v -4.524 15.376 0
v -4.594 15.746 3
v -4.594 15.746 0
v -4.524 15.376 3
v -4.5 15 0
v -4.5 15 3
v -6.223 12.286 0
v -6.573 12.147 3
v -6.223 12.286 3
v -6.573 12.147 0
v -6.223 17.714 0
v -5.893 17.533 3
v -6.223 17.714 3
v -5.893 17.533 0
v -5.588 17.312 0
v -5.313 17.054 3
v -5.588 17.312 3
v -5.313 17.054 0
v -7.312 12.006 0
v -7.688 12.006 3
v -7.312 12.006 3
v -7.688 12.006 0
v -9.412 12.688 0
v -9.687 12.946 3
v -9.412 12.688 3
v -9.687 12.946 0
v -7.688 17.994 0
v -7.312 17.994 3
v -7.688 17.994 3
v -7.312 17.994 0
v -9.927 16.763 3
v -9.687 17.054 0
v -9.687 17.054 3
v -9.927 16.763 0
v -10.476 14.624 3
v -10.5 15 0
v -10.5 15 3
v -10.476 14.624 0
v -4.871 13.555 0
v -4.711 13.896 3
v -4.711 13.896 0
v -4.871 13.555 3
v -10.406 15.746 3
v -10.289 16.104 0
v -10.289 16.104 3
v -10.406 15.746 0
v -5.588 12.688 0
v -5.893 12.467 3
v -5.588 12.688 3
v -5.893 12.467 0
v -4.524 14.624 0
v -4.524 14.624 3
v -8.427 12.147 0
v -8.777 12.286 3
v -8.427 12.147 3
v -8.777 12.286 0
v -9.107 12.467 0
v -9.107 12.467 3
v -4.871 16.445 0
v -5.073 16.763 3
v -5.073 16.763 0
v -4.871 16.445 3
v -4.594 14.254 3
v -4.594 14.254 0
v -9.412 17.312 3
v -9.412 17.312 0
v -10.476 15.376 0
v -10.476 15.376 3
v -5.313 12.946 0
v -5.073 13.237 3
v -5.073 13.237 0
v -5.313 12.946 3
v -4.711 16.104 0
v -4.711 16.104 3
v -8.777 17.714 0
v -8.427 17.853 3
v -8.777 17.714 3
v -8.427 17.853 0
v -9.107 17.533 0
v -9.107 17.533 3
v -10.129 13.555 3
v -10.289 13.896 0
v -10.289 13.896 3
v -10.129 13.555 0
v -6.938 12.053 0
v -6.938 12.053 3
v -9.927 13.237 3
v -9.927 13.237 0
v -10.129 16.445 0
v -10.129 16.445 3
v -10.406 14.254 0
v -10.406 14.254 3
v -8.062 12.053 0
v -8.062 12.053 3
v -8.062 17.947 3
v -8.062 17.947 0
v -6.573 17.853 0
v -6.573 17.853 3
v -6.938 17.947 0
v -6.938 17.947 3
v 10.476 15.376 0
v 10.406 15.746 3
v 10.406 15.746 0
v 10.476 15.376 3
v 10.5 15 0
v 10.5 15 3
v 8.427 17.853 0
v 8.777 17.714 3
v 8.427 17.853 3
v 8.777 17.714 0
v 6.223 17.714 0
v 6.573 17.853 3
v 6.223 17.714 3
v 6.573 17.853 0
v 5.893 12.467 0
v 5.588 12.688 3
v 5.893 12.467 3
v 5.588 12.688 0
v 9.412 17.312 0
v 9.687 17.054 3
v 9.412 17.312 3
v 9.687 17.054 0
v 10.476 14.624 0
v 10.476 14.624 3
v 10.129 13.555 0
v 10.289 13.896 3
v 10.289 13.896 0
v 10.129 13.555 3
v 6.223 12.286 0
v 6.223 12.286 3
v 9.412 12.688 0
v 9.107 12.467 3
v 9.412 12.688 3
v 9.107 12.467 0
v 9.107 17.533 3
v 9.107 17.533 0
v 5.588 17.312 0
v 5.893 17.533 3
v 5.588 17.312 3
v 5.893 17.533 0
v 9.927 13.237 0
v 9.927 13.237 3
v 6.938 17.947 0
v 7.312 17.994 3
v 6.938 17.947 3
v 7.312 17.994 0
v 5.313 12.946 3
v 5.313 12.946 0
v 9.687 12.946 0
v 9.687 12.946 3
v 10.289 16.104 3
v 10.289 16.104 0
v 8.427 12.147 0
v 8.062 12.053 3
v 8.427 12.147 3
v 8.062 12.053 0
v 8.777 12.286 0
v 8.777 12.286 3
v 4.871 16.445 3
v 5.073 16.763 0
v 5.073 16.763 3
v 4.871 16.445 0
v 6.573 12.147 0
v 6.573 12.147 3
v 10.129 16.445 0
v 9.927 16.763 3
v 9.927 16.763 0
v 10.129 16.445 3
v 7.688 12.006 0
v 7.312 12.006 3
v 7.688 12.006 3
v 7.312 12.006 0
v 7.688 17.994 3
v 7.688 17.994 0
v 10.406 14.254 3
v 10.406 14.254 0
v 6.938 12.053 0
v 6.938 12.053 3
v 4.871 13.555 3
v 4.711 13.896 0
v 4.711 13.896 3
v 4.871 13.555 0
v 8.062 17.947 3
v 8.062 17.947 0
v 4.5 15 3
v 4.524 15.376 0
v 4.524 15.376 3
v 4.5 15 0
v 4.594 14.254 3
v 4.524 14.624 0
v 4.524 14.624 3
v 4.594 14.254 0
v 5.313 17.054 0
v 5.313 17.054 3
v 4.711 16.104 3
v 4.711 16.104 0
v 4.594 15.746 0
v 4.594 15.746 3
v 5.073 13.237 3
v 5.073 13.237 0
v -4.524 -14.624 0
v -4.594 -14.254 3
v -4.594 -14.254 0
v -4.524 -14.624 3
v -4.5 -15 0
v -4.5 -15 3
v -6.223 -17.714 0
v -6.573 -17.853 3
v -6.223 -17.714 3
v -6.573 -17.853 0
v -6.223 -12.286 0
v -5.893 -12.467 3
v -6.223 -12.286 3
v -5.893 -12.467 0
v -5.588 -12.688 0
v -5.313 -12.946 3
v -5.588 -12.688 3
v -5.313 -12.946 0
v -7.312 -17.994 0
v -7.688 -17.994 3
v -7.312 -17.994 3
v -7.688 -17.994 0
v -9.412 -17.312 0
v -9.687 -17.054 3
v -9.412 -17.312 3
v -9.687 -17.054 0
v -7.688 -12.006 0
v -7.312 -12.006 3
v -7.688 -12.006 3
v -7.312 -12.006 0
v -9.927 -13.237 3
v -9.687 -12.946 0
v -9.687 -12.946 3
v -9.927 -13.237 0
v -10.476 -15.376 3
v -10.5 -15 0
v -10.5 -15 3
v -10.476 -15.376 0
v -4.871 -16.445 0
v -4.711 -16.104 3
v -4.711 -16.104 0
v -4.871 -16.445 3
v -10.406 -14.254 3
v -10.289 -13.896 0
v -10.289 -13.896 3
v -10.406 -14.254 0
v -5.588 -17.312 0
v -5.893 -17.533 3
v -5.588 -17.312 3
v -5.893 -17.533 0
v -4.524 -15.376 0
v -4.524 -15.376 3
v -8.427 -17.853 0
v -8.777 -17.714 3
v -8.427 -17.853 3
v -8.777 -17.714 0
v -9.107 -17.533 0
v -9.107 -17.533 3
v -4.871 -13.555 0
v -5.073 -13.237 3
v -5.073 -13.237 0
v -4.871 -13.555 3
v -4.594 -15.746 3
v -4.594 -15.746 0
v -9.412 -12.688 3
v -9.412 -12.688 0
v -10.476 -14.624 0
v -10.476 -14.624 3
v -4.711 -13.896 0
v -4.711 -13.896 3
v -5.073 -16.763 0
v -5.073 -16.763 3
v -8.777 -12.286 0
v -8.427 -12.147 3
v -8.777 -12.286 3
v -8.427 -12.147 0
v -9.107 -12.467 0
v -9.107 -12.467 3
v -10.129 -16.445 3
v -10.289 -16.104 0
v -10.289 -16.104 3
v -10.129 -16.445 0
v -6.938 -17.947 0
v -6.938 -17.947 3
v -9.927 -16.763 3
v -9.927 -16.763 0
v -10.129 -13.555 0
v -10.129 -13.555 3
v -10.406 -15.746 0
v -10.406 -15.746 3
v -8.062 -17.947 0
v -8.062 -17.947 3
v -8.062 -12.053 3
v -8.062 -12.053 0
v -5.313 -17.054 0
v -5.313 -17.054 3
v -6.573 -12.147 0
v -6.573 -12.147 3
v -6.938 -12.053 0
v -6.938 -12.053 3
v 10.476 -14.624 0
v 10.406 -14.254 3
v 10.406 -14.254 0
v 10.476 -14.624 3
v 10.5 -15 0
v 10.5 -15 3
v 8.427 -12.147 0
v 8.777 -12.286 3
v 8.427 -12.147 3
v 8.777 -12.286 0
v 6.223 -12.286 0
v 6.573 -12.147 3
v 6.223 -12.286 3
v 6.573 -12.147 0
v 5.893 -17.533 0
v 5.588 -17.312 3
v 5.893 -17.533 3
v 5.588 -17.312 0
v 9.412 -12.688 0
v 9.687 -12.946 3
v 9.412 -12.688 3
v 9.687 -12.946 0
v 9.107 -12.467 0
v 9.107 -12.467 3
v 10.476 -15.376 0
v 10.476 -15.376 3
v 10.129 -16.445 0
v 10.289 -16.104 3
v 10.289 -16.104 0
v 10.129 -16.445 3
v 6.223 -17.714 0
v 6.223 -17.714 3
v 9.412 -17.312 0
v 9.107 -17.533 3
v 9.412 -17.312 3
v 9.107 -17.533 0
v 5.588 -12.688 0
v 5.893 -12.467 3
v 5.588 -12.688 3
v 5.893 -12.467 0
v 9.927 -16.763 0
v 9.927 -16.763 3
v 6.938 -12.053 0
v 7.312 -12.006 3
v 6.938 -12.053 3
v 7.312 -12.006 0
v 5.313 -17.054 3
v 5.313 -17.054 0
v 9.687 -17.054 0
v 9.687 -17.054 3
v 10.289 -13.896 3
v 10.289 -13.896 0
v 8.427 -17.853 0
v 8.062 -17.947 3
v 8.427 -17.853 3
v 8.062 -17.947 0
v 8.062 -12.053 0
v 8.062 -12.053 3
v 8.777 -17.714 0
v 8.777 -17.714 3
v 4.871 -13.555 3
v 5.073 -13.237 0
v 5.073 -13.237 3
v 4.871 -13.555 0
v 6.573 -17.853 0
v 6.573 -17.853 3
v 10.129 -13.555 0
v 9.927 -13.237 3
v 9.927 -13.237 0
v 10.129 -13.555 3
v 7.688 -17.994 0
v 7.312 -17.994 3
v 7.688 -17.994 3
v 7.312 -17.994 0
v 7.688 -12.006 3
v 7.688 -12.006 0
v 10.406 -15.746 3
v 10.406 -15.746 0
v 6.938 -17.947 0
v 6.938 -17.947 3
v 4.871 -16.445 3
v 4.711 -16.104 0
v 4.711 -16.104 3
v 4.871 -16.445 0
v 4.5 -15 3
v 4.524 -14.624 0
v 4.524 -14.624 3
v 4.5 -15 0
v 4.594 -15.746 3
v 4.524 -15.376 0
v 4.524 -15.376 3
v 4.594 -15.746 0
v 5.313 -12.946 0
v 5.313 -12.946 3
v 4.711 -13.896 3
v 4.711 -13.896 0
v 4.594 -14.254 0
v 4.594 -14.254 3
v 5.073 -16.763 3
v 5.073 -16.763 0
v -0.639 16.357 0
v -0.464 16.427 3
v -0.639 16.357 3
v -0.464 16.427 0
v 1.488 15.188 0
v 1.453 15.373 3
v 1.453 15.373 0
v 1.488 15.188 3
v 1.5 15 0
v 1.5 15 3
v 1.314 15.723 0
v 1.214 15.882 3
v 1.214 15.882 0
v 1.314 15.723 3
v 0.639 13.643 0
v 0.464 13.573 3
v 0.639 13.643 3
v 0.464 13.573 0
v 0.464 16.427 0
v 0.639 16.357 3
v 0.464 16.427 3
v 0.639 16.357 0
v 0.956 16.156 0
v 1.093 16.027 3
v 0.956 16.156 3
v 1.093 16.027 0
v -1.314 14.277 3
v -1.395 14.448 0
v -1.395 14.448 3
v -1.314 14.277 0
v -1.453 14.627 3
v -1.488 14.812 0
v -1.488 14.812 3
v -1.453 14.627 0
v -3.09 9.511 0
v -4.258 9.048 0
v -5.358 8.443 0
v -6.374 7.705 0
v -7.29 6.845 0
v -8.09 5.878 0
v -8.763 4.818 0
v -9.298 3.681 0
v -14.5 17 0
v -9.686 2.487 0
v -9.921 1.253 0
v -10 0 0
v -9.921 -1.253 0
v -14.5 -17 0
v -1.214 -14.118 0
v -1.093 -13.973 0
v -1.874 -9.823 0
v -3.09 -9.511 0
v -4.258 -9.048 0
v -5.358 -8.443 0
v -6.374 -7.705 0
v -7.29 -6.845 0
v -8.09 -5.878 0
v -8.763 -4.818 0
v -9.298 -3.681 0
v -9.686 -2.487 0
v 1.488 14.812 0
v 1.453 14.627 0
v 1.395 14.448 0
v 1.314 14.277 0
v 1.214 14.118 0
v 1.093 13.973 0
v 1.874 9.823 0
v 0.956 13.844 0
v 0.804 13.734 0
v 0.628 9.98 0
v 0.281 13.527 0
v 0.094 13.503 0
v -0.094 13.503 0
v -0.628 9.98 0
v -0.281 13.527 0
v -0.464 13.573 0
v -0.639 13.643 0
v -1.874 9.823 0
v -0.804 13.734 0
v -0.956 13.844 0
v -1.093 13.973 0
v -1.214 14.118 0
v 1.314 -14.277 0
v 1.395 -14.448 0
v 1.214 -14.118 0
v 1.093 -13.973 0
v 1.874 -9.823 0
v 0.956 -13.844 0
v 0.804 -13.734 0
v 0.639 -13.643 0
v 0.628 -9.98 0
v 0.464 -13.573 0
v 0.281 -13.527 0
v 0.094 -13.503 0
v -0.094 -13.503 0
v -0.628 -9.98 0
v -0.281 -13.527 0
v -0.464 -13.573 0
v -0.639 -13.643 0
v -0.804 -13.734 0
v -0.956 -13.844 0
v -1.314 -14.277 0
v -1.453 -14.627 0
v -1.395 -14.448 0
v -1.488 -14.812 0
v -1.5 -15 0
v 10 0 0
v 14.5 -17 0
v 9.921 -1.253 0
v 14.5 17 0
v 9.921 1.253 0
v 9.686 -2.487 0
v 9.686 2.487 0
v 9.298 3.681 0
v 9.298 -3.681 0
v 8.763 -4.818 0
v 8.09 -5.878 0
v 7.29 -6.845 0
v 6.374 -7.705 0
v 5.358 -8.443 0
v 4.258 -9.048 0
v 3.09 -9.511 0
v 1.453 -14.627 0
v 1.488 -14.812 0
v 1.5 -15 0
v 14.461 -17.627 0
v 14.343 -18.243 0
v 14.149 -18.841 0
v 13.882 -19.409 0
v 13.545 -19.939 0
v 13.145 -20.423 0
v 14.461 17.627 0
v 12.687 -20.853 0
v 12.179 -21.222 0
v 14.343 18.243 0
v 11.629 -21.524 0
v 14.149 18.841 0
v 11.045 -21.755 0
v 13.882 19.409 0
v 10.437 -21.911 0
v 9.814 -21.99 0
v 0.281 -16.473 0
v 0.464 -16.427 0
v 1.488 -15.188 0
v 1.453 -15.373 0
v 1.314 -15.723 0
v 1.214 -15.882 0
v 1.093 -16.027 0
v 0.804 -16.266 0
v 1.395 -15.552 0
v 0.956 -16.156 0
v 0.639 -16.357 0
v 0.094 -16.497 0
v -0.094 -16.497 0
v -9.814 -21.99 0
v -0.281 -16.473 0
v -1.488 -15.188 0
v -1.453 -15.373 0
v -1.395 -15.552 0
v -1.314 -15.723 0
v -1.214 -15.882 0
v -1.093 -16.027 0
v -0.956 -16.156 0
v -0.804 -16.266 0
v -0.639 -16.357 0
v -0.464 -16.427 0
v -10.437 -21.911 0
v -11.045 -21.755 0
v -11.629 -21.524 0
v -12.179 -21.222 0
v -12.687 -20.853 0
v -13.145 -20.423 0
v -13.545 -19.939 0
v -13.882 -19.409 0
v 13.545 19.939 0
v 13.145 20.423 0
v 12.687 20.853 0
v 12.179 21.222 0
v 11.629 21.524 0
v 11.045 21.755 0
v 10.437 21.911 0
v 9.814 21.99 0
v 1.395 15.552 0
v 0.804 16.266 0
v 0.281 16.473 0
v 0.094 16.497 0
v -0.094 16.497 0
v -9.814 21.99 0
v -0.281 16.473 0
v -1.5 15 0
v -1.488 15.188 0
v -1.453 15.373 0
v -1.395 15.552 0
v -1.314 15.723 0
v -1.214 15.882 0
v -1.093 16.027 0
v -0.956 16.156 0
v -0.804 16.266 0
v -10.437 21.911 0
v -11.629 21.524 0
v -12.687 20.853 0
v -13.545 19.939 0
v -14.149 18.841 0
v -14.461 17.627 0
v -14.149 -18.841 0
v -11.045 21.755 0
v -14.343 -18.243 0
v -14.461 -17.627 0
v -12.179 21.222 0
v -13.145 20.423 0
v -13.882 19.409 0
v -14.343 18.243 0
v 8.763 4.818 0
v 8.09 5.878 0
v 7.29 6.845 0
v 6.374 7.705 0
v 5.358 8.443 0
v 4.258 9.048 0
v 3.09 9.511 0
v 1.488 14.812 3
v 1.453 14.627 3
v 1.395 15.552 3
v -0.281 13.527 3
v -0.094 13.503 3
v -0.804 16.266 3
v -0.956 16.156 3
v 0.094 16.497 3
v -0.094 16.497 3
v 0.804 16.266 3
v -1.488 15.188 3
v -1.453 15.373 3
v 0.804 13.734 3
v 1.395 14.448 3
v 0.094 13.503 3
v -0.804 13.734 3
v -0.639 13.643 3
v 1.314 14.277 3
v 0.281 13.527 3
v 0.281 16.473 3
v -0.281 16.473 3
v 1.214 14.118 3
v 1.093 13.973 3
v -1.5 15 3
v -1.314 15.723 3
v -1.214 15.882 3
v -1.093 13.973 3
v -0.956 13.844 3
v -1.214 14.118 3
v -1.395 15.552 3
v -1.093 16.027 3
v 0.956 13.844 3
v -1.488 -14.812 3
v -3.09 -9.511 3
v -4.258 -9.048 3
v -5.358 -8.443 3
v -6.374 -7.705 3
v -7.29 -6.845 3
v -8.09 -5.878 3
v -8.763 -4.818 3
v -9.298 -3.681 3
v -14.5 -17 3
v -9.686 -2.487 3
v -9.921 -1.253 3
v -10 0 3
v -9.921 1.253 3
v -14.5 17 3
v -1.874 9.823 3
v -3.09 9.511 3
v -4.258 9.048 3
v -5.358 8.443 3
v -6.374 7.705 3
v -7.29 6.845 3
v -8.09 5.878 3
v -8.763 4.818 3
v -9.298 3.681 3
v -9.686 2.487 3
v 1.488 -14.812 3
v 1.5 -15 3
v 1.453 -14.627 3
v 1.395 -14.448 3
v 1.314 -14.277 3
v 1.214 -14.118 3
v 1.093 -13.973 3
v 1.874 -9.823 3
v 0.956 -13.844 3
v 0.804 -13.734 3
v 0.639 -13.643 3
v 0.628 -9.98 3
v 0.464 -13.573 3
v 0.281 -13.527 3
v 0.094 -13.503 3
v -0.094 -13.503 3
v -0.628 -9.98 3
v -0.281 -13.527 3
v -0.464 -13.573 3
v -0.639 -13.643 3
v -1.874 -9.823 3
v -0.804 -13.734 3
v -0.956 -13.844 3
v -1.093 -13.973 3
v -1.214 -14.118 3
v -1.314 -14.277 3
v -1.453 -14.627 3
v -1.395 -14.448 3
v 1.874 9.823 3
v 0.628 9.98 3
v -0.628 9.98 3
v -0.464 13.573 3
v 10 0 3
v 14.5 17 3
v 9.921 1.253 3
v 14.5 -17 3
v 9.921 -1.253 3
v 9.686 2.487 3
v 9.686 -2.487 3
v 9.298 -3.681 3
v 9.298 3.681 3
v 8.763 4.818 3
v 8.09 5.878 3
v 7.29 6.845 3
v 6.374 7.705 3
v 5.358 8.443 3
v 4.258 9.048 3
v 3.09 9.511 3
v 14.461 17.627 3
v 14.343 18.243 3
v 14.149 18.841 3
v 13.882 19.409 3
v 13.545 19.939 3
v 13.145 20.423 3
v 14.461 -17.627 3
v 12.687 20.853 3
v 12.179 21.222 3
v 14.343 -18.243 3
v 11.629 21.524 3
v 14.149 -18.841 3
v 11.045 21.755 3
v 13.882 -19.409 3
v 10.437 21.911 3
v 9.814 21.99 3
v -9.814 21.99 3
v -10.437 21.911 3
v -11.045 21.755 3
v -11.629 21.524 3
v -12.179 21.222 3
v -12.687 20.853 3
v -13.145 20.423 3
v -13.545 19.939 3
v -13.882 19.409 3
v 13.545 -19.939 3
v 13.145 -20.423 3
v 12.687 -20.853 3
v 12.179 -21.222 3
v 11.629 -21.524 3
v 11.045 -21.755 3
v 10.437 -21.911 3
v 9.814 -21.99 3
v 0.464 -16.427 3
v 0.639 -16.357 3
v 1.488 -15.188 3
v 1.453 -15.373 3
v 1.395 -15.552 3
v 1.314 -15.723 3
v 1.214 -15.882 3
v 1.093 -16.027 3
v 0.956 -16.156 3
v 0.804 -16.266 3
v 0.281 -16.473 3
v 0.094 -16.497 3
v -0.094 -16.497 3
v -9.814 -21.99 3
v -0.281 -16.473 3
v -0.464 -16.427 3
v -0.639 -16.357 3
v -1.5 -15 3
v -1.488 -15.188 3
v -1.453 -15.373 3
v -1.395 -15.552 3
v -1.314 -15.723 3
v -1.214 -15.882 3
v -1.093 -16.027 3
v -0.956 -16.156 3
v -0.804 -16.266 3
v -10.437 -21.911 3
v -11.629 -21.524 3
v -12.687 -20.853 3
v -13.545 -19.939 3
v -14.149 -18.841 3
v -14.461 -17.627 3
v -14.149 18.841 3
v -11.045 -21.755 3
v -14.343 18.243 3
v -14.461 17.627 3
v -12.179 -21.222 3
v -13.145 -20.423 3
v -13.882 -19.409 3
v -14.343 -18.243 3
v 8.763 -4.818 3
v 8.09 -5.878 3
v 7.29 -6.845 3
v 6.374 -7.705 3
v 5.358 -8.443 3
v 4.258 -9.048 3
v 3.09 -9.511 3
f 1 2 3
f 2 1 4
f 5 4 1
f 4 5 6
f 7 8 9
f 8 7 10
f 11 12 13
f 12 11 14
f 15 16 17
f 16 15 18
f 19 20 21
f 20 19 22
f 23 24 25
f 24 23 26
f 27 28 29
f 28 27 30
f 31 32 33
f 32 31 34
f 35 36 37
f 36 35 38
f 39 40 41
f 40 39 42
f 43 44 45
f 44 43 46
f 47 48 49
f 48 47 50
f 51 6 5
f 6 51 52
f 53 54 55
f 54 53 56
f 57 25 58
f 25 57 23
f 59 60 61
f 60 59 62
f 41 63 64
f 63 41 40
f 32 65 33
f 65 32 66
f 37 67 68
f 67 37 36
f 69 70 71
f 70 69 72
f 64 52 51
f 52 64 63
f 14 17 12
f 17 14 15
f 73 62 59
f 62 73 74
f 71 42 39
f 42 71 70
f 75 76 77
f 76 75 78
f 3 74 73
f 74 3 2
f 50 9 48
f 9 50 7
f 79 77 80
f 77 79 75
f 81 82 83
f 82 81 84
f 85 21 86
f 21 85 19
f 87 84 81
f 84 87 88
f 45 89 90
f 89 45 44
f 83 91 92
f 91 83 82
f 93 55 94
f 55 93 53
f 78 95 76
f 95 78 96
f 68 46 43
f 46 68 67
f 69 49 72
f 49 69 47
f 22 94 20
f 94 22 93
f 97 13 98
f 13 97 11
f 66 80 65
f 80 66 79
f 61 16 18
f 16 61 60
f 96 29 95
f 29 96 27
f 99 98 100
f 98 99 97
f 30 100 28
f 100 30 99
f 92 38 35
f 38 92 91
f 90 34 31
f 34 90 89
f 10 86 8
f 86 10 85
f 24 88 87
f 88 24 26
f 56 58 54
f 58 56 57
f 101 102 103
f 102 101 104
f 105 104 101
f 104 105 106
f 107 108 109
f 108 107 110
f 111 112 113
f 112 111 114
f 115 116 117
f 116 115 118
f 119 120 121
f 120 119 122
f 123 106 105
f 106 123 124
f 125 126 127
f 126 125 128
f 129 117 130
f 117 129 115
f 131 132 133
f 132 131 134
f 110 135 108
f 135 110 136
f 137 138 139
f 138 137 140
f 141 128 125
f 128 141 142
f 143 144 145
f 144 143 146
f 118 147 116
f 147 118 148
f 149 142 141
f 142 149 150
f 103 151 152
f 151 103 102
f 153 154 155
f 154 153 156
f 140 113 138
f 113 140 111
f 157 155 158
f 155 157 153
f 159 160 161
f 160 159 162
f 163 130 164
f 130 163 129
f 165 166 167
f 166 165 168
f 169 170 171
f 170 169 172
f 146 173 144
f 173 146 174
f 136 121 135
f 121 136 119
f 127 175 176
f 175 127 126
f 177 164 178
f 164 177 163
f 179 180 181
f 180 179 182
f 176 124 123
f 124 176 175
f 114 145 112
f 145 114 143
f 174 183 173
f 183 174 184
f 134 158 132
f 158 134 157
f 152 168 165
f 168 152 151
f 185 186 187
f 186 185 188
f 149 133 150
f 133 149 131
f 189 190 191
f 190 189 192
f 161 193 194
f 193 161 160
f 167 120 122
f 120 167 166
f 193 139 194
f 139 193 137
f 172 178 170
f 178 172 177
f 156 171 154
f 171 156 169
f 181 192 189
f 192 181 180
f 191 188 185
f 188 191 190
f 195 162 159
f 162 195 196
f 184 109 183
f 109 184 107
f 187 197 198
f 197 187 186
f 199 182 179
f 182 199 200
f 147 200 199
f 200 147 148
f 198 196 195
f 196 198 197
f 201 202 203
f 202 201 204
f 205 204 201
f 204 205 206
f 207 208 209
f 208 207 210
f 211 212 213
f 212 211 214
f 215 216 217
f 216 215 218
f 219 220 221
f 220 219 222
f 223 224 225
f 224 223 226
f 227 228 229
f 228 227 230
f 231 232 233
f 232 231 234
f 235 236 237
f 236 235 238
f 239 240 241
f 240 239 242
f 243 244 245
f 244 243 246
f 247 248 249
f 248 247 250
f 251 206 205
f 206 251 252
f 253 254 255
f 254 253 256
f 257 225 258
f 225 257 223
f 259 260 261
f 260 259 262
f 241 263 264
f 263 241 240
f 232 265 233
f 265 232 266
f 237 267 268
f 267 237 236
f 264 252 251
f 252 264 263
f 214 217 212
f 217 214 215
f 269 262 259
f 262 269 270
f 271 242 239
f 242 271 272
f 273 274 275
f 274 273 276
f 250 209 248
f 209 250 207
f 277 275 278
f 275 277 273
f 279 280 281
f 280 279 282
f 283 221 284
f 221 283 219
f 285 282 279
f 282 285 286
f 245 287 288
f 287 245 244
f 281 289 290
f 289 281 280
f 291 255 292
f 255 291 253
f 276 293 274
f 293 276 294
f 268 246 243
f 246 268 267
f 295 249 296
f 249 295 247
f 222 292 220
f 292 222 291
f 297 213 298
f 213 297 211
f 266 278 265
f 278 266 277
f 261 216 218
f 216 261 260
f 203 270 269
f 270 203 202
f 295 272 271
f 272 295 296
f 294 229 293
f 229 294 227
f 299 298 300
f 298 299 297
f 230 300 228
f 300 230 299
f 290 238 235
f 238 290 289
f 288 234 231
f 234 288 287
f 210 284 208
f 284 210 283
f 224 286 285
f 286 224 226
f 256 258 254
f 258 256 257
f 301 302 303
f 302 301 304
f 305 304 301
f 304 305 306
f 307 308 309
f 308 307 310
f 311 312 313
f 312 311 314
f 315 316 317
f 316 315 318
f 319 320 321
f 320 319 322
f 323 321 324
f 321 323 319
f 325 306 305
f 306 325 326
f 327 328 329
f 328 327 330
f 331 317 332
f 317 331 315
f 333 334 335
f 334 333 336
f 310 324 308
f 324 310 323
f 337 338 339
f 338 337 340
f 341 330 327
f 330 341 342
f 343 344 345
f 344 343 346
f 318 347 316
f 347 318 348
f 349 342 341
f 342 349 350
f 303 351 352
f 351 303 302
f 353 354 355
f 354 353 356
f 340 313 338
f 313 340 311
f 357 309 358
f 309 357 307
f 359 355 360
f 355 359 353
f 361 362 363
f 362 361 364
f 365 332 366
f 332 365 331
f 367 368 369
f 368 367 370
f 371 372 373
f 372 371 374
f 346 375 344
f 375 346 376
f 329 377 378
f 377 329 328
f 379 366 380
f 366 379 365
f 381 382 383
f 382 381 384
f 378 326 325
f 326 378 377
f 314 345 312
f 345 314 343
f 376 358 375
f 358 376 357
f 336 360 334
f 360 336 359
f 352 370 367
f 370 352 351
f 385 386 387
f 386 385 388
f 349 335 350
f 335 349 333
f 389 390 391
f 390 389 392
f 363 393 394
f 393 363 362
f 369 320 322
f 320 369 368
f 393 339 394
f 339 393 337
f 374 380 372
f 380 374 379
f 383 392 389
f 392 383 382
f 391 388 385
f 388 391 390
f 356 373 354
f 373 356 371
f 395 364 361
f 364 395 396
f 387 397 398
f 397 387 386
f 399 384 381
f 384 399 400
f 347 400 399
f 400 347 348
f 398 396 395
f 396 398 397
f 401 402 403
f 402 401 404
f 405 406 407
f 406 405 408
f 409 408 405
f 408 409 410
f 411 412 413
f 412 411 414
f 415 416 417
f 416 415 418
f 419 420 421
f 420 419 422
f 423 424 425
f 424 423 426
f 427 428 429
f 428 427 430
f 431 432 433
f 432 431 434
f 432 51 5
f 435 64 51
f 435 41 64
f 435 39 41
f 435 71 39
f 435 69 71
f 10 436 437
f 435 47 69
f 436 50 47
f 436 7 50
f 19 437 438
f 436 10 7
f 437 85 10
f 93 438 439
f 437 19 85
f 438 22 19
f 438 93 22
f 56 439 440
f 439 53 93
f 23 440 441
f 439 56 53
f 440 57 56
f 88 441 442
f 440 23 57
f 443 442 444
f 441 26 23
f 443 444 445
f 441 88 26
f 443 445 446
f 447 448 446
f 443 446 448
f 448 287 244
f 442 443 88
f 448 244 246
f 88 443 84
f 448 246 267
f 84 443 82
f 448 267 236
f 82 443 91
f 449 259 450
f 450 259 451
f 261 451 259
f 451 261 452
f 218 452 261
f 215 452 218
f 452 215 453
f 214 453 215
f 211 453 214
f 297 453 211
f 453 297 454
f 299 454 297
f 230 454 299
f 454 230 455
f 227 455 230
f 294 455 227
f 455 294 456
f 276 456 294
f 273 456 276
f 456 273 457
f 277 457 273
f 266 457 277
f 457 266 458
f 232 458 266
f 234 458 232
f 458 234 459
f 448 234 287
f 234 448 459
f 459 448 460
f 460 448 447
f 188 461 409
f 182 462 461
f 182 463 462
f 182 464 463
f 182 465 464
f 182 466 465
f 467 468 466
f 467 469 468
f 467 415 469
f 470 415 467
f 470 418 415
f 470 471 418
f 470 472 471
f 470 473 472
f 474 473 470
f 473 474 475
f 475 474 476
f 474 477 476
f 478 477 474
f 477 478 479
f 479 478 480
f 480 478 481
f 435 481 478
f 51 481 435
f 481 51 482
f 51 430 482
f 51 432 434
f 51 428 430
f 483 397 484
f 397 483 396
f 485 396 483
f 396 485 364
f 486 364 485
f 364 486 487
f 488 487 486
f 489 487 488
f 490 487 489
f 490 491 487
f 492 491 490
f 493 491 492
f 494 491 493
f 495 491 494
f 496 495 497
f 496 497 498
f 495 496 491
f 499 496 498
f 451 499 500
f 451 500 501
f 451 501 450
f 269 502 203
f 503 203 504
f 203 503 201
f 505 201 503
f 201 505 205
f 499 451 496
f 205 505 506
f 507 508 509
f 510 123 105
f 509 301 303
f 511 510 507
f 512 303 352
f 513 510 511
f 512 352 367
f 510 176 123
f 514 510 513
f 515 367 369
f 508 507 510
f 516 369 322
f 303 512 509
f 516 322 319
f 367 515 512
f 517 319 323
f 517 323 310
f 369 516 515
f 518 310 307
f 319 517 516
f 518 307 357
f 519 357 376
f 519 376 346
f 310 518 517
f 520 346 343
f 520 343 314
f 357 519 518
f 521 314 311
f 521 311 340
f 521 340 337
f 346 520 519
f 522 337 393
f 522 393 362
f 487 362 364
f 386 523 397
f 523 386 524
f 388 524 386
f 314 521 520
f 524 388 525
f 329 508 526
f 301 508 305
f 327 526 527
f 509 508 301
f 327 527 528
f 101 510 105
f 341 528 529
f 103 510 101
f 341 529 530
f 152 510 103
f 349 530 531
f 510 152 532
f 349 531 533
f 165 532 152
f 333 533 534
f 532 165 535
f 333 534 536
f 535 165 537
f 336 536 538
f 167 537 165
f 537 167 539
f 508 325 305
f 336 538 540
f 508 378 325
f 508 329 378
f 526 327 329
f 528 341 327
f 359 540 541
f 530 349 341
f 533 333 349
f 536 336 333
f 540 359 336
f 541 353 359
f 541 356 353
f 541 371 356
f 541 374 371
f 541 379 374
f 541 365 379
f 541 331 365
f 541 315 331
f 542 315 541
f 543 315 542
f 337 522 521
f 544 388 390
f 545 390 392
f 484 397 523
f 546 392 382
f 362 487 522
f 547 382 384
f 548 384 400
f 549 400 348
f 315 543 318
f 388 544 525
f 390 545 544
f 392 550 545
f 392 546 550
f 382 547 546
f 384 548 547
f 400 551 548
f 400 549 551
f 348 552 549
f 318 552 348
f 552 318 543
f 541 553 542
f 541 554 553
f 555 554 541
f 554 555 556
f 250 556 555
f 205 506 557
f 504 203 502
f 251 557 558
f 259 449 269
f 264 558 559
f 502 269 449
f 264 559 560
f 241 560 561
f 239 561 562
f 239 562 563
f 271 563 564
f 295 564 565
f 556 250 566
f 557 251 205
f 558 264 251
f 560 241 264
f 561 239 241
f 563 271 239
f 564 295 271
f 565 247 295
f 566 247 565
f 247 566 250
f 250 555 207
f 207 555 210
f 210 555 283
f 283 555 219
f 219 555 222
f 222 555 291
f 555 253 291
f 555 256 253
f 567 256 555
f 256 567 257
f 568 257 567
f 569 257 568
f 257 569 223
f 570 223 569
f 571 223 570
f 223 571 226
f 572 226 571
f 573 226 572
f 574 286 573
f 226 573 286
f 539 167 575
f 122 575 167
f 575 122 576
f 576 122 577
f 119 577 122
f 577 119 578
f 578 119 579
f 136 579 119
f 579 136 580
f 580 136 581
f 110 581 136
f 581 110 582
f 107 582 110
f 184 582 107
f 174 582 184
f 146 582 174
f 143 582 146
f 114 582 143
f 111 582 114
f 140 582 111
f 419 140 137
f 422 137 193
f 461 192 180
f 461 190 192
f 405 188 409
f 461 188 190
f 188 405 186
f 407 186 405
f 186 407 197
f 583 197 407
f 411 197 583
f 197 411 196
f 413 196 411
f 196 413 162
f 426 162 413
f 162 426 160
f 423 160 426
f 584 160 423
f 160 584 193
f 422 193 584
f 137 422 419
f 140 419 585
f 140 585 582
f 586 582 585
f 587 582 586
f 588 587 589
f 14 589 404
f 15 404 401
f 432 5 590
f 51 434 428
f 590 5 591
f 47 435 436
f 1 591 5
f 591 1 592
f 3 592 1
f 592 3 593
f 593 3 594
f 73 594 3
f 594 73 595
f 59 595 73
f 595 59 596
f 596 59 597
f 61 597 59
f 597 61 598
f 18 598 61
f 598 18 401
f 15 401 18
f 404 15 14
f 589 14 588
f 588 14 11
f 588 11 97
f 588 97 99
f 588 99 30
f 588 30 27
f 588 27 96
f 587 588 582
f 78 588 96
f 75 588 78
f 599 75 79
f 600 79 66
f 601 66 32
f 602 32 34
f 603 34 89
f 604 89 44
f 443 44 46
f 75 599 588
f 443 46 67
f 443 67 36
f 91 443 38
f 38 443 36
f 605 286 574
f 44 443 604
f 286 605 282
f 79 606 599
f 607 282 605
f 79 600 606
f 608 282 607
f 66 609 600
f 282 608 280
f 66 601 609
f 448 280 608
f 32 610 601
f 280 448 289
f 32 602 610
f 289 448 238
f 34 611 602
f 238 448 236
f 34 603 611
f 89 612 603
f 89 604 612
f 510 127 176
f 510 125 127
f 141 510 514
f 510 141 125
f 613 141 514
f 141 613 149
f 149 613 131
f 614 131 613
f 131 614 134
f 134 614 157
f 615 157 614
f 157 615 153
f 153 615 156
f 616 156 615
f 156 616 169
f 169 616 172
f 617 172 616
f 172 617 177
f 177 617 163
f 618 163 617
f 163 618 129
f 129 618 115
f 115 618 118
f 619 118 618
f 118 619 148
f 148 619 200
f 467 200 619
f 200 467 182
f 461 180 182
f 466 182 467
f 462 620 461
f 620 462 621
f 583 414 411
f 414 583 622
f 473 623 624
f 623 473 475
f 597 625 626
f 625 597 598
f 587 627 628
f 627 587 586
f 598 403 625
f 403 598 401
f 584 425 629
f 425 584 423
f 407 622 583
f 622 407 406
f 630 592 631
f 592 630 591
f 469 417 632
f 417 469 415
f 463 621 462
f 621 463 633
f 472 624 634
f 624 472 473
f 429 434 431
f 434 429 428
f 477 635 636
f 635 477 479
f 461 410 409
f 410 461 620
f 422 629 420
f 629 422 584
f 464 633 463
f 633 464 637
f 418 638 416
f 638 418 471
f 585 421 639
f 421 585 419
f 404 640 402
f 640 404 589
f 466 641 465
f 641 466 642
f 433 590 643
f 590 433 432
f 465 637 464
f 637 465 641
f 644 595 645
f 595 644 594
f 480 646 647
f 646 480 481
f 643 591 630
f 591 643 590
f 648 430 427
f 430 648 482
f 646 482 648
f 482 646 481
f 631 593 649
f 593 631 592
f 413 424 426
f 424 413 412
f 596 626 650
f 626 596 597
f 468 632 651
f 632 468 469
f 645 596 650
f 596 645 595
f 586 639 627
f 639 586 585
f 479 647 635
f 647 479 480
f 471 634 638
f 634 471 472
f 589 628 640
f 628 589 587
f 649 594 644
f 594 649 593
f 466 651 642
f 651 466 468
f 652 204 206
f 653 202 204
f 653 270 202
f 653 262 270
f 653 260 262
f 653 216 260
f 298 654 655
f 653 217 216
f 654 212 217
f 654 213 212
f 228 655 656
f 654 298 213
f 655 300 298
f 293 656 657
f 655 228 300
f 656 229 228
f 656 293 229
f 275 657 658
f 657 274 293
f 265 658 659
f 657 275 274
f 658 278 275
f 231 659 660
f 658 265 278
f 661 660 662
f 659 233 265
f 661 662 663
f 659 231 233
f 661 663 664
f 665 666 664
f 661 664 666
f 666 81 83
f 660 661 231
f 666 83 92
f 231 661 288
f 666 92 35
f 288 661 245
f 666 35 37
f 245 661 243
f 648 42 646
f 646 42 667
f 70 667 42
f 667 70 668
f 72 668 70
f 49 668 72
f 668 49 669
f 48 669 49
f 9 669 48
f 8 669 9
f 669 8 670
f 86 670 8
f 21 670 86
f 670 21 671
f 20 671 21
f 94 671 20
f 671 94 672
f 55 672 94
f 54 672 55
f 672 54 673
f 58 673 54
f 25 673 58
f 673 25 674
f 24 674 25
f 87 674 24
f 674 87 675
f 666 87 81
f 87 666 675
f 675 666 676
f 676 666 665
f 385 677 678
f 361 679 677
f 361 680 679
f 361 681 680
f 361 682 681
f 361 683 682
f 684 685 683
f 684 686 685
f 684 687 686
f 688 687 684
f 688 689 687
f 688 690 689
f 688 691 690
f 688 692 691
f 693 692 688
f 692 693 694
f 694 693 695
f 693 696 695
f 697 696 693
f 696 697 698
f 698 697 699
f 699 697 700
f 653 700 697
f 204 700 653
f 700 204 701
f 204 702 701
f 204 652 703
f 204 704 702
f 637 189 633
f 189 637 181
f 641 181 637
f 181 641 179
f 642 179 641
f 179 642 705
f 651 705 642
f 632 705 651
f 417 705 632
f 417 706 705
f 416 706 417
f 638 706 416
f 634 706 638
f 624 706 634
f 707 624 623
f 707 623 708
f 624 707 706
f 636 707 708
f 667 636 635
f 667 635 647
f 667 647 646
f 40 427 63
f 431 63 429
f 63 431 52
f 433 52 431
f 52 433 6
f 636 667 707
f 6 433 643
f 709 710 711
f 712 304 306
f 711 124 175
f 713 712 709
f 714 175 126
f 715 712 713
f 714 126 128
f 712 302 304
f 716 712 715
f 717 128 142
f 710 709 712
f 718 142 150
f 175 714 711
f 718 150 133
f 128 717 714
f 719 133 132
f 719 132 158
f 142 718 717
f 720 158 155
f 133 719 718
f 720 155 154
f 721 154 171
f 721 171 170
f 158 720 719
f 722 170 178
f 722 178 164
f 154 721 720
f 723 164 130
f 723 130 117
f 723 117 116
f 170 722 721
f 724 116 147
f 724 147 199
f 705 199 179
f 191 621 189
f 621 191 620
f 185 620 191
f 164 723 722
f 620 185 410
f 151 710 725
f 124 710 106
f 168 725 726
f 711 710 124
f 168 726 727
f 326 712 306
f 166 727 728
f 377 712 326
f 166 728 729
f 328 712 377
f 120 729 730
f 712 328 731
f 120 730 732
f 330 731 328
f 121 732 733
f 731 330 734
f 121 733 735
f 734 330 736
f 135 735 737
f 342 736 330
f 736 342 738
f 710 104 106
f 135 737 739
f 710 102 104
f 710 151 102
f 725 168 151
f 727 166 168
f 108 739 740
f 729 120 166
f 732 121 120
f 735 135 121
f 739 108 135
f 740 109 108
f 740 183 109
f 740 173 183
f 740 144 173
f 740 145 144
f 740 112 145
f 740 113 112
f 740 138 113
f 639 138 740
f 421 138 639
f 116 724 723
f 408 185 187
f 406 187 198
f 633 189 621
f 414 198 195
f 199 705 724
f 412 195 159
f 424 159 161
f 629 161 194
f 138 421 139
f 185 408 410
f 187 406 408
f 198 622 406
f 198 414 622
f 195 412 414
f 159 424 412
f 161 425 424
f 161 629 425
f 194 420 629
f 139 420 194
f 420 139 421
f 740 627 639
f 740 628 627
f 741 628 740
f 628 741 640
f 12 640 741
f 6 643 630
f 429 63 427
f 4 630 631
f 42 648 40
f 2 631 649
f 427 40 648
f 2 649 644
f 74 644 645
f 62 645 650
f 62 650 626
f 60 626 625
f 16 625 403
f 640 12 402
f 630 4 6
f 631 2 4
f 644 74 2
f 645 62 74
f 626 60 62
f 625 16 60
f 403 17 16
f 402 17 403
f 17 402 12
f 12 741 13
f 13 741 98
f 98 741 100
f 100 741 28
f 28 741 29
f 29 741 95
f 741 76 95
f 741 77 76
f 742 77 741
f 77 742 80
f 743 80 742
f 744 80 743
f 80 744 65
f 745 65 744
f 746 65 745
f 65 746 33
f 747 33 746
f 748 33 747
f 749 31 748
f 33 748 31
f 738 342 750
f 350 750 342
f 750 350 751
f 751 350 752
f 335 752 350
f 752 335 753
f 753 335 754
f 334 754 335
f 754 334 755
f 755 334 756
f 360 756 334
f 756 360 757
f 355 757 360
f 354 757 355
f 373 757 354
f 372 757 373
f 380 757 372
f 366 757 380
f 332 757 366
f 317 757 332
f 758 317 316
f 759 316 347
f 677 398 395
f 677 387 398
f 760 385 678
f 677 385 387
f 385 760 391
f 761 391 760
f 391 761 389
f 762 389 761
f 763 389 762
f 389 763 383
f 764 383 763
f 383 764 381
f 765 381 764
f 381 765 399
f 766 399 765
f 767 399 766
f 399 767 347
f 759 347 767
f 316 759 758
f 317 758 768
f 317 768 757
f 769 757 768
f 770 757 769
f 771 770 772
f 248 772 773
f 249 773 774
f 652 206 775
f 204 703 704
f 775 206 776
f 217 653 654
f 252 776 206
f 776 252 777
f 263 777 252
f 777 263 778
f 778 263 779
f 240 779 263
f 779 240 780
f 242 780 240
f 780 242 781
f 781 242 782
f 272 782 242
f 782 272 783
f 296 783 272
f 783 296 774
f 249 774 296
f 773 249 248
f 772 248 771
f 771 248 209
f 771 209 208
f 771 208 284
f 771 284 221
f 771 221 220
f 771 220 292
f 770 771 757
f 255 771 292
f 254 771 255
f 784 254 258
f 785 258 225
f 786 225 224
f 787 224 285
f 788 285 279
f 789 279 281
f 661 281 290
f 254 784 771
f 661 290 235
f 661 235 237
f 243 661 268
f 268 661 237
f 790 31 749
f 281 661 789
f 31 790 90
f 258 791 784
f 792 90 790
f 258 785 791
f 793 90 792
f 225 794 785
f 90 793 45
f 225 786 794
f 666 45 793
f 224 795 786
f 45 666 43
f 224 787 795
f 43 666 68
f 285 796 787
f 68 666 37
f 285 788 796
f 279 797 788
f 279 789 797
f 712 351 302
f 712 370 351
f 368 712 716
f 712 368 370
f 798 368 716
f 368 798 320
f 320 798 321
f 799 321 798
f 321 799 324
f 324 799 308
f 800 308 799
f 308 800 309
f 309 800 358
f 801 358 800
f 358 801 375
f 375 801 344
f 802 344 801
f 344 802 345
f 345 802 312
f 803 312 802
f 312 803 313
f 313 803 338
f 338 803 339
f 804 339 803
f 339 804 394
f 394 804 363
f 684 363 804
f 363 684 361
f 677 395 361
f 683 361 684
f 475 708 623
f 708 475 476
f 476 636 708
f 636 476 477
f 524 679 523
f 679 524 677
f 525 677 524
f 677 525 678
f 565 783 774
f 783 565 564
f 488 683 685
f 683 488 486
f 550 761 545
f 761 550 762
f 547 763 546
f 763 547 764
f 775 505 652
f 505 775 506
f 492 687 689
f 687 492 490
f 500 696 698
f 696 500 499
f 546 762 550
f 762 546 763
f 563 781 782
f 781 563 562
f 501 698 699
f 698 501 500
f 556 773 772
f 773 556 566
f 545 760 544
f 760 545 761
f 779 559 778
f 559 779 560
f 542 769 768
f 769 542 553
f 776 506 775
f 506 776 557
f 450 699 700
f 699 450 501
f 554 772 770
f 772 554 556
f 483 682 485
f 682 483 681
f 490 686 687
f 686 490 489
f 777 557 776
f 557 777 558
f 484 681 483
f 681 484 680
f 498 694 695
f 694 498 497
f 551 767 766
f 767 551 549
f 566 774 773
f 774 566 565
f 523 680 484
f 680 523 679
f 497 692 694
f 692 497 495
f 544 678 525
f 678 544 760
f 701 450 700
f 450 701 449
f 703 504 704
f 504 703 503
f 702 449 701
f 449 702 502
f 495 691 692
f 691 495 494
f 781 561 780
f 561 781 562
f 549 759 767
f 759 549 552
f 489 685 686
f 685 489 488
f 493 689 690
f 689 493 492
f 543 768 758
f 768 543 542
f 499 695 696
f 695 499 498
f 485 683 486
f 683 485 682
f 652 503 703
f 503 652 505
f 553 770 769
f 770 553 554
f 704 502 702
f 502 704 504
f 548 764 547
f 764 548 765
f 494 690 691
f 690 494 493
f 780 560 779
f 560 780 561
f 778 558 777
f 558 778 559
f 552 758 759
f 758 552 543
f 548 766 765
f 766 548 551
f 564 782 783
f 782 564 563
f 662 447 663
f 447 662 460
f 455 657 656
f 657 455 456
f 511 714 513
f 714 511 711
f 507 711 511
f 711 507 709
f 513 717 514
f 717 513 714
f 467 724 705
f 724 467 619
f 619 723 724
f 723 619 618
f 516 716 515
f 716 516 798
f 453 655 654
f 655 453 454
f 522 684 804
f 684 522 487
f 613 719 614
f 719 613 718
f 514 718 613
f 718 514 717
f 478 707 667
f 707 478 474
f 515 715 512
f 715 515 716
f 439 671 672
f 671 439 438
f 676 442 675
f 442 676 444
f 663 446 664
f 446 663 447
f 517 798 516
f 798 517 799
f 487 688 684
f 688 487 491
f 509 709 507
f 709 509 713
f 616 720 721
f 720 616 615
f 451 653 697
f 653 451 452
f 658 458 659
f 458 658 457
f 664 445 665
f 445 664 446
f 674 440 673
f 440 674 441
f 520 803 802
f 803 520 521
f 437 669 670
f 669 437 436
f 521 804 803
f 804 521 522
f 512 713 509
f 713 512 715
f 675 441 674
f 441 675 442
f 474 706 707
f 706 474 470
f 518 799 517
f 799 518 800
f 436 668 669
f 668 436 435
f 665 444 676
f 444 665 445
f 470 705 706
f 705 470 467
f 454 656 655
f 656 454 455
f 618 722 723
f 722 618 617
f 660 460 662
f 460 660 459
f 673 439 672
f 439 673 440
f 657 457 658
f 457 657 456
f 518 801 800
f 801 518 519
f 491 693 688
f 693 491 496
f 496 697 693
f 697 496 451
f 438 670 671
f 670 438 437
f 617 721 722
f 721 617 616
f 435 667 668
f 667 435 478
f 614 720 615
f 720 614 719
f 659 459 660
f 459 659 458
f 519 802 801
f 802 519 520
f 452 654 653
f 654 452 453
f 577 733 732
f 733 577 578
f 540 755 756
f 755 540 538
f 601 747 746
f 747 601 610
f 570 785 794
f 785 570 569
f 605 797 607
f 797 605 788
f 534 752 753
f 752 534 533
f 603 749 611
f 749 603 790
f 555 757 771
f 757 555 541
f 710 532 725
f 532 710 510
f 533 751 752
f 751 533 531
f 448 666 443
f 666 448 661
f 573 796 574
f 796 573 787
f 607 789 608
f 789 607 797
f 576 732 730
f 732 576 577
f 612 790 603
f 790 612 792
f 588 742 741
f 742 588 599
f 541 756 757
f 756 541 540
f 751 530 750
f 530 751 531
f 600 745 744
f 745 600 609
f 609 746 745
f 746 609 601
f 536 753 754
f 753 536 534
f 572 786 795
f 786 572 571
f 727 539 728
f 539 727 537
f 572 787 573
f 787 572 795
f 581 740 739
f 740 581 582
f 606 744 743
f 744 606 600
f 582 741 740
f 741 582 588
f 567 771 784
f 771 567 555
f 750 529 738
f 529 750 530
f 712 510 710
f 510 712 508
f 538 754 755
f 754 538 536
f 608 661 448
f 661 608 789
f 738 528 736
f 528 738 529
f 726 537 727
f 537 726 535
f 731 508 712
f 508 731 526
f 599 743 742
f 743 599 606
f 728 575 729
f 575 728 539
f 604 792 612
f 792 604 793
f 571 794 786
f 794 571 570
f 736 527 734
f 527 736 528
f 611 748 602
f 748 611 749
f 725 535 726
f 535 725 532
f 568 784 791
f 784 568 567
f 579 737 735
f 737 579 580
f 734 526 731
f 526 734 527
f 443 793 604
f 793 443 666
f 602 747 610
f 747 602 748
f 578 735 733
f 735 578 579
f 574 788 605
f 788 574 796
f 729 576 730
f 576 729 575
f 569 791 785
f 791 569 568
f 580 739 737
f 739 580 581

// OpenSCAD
$fn = 50;


difference() {
	union() {
		hull() {
			translate(v = [-9.5000000000, 17.0000000000, 0]) {
				cylinder(h = 3, r = 5);
			}
			translate(v = [9.5000000000, 17.0000000000, 0]) {
				cylinder(h = 3, r = 5);
			}
			translate(v = [-9.5000000000, -17.0000000000, 0]) {
				cylinder(h = 3, r = 5);
			}
			translate(v = [9.5000000000, -17.0000000000, 0]) {
				cylinder(h = 3, r = 5);
			}
		}
	}
	union() {
		#translate(v = [-7.5000000000, 15.0000000000, 0]) {
			cylinder(h = 3, r = 3.0000000000);
		}
		#translate(v = [7.5000000000, 15.0000000000, 0]) {
			cylinder(h = 3, r = 3.0000000000);
		}
		#translate(v = [-7.5000000000, -15.0000000000, 0]) {
			cylinder(h = 3, r = 3.0000000000);
		}
		#translate(v = [7.5000000000, -15.0000000000, 0]) {
			cylinder(h = 3, r = 3.0000000000);
		}
		#translate(v = [-7.5000000000, -15.0000000000, -100.0000000000]) {
			cylinder(h = 200, r = 3.0000000000);
		}
		#translate(v = [-7.5000000000, 15.0000000000, -100.0000000000]) {
			cylinder(h = 200, r = 3.0000000000);
		}
		#translate(v = [7.5000000000, -15.0000000000, -100.0000000000]) {
			cylinder(h = 200, r = 3.0000000000);
		}
		#translate(v = [7.5000000000, 15.0000000000, -100.0000000000]) {
			cylinder(h = 200, r = 3.0000000000);
		}
		#translate(v = [-7.5000000000, 15.0000000000, 0]) {
			cylinder(h = 3, r = 1.5000000000);
		}
		#translate(v = [0.0000000000, 15.0000000000, 0]) {
			cylinder(h = 3, r = 1.5000000000);
		}
		#translate(v = [7.5000000000, 15.0000000000, 0]) {
			cylinder(h = 3, r = 1.5000000000);
		}
		#translate(v = [-7.5000000000, -15.0000000000, 0]) {
			cylinder(h = 3, r = 1.5000000000);
		}
		#translate(v = [0.0000000000, -15.0000000000, 0]) {
			cylinder(h = 3, r = 1.5000000000);
		}
		#translate(v = [7.5000000000, -15.0000000000, 0]) {
			cylinder(h = 3, r = 1.5000000000);
		}
		#translate(v = [-7.5000000000, 15.0000000000, 0]) {
			cylinder(h = 3, r = 1.5000000000);
		}
		#translate(v = [0.0000000000, 15.0000000000, 0]) {
			cylinder(h = 3, r = 1.5000000000);
		}
		#translate(v = [7.5000000000, 15.0000000000, 0]) {
			cylinder(h = 3, r = 1.5000000000);
		}
		#translate(v = [-7.5000000000, -15.0000000000, 0]) {
			cylinder(h = 3, r = 1.5000000000);
		}
		#translate(v = [0.0000000000, -15.0000000000, 0]) {
			cylinder(h = 3, r = 1.5000000000);
		}
		#translate(v = [7.5000000000, -15.0000000000, 0]) {
			cylinder(h = 3, r = 1.5000000000);
		}
		#translate(v = [-7.5000000000, 15.0000000000, 0]) {
			cylinder(h = 3, r = 1.5000000000);
		}
		#translate(v = [0.0000000000, 15.0000000000, 0]) {
			cylinder(h = 3, r = 1.5000000000);
		}
		#translate(v = [7.5000000000, 15.0000000000, 0]) {
			cylinder(h = 3, r = 1.5000000000);
		}
		#translate(v = [-7.5000000000, -15.0000000000, 0]) {
			cylinder(h = 3, r = 1.5000000000);
		}
		#translate(v = [0.0000000000, -15.0000000000, 0]) {
			cylinder(h = 3, r = 1.5000000000);
		}
		#translate(v = [7.5000000000, -15.0000000000, 0]) {
			cylinder(h = 3, r = 1.5000000000);
		}
		#cylinder(h = 3, r = 10.0000000000);
	}
}
